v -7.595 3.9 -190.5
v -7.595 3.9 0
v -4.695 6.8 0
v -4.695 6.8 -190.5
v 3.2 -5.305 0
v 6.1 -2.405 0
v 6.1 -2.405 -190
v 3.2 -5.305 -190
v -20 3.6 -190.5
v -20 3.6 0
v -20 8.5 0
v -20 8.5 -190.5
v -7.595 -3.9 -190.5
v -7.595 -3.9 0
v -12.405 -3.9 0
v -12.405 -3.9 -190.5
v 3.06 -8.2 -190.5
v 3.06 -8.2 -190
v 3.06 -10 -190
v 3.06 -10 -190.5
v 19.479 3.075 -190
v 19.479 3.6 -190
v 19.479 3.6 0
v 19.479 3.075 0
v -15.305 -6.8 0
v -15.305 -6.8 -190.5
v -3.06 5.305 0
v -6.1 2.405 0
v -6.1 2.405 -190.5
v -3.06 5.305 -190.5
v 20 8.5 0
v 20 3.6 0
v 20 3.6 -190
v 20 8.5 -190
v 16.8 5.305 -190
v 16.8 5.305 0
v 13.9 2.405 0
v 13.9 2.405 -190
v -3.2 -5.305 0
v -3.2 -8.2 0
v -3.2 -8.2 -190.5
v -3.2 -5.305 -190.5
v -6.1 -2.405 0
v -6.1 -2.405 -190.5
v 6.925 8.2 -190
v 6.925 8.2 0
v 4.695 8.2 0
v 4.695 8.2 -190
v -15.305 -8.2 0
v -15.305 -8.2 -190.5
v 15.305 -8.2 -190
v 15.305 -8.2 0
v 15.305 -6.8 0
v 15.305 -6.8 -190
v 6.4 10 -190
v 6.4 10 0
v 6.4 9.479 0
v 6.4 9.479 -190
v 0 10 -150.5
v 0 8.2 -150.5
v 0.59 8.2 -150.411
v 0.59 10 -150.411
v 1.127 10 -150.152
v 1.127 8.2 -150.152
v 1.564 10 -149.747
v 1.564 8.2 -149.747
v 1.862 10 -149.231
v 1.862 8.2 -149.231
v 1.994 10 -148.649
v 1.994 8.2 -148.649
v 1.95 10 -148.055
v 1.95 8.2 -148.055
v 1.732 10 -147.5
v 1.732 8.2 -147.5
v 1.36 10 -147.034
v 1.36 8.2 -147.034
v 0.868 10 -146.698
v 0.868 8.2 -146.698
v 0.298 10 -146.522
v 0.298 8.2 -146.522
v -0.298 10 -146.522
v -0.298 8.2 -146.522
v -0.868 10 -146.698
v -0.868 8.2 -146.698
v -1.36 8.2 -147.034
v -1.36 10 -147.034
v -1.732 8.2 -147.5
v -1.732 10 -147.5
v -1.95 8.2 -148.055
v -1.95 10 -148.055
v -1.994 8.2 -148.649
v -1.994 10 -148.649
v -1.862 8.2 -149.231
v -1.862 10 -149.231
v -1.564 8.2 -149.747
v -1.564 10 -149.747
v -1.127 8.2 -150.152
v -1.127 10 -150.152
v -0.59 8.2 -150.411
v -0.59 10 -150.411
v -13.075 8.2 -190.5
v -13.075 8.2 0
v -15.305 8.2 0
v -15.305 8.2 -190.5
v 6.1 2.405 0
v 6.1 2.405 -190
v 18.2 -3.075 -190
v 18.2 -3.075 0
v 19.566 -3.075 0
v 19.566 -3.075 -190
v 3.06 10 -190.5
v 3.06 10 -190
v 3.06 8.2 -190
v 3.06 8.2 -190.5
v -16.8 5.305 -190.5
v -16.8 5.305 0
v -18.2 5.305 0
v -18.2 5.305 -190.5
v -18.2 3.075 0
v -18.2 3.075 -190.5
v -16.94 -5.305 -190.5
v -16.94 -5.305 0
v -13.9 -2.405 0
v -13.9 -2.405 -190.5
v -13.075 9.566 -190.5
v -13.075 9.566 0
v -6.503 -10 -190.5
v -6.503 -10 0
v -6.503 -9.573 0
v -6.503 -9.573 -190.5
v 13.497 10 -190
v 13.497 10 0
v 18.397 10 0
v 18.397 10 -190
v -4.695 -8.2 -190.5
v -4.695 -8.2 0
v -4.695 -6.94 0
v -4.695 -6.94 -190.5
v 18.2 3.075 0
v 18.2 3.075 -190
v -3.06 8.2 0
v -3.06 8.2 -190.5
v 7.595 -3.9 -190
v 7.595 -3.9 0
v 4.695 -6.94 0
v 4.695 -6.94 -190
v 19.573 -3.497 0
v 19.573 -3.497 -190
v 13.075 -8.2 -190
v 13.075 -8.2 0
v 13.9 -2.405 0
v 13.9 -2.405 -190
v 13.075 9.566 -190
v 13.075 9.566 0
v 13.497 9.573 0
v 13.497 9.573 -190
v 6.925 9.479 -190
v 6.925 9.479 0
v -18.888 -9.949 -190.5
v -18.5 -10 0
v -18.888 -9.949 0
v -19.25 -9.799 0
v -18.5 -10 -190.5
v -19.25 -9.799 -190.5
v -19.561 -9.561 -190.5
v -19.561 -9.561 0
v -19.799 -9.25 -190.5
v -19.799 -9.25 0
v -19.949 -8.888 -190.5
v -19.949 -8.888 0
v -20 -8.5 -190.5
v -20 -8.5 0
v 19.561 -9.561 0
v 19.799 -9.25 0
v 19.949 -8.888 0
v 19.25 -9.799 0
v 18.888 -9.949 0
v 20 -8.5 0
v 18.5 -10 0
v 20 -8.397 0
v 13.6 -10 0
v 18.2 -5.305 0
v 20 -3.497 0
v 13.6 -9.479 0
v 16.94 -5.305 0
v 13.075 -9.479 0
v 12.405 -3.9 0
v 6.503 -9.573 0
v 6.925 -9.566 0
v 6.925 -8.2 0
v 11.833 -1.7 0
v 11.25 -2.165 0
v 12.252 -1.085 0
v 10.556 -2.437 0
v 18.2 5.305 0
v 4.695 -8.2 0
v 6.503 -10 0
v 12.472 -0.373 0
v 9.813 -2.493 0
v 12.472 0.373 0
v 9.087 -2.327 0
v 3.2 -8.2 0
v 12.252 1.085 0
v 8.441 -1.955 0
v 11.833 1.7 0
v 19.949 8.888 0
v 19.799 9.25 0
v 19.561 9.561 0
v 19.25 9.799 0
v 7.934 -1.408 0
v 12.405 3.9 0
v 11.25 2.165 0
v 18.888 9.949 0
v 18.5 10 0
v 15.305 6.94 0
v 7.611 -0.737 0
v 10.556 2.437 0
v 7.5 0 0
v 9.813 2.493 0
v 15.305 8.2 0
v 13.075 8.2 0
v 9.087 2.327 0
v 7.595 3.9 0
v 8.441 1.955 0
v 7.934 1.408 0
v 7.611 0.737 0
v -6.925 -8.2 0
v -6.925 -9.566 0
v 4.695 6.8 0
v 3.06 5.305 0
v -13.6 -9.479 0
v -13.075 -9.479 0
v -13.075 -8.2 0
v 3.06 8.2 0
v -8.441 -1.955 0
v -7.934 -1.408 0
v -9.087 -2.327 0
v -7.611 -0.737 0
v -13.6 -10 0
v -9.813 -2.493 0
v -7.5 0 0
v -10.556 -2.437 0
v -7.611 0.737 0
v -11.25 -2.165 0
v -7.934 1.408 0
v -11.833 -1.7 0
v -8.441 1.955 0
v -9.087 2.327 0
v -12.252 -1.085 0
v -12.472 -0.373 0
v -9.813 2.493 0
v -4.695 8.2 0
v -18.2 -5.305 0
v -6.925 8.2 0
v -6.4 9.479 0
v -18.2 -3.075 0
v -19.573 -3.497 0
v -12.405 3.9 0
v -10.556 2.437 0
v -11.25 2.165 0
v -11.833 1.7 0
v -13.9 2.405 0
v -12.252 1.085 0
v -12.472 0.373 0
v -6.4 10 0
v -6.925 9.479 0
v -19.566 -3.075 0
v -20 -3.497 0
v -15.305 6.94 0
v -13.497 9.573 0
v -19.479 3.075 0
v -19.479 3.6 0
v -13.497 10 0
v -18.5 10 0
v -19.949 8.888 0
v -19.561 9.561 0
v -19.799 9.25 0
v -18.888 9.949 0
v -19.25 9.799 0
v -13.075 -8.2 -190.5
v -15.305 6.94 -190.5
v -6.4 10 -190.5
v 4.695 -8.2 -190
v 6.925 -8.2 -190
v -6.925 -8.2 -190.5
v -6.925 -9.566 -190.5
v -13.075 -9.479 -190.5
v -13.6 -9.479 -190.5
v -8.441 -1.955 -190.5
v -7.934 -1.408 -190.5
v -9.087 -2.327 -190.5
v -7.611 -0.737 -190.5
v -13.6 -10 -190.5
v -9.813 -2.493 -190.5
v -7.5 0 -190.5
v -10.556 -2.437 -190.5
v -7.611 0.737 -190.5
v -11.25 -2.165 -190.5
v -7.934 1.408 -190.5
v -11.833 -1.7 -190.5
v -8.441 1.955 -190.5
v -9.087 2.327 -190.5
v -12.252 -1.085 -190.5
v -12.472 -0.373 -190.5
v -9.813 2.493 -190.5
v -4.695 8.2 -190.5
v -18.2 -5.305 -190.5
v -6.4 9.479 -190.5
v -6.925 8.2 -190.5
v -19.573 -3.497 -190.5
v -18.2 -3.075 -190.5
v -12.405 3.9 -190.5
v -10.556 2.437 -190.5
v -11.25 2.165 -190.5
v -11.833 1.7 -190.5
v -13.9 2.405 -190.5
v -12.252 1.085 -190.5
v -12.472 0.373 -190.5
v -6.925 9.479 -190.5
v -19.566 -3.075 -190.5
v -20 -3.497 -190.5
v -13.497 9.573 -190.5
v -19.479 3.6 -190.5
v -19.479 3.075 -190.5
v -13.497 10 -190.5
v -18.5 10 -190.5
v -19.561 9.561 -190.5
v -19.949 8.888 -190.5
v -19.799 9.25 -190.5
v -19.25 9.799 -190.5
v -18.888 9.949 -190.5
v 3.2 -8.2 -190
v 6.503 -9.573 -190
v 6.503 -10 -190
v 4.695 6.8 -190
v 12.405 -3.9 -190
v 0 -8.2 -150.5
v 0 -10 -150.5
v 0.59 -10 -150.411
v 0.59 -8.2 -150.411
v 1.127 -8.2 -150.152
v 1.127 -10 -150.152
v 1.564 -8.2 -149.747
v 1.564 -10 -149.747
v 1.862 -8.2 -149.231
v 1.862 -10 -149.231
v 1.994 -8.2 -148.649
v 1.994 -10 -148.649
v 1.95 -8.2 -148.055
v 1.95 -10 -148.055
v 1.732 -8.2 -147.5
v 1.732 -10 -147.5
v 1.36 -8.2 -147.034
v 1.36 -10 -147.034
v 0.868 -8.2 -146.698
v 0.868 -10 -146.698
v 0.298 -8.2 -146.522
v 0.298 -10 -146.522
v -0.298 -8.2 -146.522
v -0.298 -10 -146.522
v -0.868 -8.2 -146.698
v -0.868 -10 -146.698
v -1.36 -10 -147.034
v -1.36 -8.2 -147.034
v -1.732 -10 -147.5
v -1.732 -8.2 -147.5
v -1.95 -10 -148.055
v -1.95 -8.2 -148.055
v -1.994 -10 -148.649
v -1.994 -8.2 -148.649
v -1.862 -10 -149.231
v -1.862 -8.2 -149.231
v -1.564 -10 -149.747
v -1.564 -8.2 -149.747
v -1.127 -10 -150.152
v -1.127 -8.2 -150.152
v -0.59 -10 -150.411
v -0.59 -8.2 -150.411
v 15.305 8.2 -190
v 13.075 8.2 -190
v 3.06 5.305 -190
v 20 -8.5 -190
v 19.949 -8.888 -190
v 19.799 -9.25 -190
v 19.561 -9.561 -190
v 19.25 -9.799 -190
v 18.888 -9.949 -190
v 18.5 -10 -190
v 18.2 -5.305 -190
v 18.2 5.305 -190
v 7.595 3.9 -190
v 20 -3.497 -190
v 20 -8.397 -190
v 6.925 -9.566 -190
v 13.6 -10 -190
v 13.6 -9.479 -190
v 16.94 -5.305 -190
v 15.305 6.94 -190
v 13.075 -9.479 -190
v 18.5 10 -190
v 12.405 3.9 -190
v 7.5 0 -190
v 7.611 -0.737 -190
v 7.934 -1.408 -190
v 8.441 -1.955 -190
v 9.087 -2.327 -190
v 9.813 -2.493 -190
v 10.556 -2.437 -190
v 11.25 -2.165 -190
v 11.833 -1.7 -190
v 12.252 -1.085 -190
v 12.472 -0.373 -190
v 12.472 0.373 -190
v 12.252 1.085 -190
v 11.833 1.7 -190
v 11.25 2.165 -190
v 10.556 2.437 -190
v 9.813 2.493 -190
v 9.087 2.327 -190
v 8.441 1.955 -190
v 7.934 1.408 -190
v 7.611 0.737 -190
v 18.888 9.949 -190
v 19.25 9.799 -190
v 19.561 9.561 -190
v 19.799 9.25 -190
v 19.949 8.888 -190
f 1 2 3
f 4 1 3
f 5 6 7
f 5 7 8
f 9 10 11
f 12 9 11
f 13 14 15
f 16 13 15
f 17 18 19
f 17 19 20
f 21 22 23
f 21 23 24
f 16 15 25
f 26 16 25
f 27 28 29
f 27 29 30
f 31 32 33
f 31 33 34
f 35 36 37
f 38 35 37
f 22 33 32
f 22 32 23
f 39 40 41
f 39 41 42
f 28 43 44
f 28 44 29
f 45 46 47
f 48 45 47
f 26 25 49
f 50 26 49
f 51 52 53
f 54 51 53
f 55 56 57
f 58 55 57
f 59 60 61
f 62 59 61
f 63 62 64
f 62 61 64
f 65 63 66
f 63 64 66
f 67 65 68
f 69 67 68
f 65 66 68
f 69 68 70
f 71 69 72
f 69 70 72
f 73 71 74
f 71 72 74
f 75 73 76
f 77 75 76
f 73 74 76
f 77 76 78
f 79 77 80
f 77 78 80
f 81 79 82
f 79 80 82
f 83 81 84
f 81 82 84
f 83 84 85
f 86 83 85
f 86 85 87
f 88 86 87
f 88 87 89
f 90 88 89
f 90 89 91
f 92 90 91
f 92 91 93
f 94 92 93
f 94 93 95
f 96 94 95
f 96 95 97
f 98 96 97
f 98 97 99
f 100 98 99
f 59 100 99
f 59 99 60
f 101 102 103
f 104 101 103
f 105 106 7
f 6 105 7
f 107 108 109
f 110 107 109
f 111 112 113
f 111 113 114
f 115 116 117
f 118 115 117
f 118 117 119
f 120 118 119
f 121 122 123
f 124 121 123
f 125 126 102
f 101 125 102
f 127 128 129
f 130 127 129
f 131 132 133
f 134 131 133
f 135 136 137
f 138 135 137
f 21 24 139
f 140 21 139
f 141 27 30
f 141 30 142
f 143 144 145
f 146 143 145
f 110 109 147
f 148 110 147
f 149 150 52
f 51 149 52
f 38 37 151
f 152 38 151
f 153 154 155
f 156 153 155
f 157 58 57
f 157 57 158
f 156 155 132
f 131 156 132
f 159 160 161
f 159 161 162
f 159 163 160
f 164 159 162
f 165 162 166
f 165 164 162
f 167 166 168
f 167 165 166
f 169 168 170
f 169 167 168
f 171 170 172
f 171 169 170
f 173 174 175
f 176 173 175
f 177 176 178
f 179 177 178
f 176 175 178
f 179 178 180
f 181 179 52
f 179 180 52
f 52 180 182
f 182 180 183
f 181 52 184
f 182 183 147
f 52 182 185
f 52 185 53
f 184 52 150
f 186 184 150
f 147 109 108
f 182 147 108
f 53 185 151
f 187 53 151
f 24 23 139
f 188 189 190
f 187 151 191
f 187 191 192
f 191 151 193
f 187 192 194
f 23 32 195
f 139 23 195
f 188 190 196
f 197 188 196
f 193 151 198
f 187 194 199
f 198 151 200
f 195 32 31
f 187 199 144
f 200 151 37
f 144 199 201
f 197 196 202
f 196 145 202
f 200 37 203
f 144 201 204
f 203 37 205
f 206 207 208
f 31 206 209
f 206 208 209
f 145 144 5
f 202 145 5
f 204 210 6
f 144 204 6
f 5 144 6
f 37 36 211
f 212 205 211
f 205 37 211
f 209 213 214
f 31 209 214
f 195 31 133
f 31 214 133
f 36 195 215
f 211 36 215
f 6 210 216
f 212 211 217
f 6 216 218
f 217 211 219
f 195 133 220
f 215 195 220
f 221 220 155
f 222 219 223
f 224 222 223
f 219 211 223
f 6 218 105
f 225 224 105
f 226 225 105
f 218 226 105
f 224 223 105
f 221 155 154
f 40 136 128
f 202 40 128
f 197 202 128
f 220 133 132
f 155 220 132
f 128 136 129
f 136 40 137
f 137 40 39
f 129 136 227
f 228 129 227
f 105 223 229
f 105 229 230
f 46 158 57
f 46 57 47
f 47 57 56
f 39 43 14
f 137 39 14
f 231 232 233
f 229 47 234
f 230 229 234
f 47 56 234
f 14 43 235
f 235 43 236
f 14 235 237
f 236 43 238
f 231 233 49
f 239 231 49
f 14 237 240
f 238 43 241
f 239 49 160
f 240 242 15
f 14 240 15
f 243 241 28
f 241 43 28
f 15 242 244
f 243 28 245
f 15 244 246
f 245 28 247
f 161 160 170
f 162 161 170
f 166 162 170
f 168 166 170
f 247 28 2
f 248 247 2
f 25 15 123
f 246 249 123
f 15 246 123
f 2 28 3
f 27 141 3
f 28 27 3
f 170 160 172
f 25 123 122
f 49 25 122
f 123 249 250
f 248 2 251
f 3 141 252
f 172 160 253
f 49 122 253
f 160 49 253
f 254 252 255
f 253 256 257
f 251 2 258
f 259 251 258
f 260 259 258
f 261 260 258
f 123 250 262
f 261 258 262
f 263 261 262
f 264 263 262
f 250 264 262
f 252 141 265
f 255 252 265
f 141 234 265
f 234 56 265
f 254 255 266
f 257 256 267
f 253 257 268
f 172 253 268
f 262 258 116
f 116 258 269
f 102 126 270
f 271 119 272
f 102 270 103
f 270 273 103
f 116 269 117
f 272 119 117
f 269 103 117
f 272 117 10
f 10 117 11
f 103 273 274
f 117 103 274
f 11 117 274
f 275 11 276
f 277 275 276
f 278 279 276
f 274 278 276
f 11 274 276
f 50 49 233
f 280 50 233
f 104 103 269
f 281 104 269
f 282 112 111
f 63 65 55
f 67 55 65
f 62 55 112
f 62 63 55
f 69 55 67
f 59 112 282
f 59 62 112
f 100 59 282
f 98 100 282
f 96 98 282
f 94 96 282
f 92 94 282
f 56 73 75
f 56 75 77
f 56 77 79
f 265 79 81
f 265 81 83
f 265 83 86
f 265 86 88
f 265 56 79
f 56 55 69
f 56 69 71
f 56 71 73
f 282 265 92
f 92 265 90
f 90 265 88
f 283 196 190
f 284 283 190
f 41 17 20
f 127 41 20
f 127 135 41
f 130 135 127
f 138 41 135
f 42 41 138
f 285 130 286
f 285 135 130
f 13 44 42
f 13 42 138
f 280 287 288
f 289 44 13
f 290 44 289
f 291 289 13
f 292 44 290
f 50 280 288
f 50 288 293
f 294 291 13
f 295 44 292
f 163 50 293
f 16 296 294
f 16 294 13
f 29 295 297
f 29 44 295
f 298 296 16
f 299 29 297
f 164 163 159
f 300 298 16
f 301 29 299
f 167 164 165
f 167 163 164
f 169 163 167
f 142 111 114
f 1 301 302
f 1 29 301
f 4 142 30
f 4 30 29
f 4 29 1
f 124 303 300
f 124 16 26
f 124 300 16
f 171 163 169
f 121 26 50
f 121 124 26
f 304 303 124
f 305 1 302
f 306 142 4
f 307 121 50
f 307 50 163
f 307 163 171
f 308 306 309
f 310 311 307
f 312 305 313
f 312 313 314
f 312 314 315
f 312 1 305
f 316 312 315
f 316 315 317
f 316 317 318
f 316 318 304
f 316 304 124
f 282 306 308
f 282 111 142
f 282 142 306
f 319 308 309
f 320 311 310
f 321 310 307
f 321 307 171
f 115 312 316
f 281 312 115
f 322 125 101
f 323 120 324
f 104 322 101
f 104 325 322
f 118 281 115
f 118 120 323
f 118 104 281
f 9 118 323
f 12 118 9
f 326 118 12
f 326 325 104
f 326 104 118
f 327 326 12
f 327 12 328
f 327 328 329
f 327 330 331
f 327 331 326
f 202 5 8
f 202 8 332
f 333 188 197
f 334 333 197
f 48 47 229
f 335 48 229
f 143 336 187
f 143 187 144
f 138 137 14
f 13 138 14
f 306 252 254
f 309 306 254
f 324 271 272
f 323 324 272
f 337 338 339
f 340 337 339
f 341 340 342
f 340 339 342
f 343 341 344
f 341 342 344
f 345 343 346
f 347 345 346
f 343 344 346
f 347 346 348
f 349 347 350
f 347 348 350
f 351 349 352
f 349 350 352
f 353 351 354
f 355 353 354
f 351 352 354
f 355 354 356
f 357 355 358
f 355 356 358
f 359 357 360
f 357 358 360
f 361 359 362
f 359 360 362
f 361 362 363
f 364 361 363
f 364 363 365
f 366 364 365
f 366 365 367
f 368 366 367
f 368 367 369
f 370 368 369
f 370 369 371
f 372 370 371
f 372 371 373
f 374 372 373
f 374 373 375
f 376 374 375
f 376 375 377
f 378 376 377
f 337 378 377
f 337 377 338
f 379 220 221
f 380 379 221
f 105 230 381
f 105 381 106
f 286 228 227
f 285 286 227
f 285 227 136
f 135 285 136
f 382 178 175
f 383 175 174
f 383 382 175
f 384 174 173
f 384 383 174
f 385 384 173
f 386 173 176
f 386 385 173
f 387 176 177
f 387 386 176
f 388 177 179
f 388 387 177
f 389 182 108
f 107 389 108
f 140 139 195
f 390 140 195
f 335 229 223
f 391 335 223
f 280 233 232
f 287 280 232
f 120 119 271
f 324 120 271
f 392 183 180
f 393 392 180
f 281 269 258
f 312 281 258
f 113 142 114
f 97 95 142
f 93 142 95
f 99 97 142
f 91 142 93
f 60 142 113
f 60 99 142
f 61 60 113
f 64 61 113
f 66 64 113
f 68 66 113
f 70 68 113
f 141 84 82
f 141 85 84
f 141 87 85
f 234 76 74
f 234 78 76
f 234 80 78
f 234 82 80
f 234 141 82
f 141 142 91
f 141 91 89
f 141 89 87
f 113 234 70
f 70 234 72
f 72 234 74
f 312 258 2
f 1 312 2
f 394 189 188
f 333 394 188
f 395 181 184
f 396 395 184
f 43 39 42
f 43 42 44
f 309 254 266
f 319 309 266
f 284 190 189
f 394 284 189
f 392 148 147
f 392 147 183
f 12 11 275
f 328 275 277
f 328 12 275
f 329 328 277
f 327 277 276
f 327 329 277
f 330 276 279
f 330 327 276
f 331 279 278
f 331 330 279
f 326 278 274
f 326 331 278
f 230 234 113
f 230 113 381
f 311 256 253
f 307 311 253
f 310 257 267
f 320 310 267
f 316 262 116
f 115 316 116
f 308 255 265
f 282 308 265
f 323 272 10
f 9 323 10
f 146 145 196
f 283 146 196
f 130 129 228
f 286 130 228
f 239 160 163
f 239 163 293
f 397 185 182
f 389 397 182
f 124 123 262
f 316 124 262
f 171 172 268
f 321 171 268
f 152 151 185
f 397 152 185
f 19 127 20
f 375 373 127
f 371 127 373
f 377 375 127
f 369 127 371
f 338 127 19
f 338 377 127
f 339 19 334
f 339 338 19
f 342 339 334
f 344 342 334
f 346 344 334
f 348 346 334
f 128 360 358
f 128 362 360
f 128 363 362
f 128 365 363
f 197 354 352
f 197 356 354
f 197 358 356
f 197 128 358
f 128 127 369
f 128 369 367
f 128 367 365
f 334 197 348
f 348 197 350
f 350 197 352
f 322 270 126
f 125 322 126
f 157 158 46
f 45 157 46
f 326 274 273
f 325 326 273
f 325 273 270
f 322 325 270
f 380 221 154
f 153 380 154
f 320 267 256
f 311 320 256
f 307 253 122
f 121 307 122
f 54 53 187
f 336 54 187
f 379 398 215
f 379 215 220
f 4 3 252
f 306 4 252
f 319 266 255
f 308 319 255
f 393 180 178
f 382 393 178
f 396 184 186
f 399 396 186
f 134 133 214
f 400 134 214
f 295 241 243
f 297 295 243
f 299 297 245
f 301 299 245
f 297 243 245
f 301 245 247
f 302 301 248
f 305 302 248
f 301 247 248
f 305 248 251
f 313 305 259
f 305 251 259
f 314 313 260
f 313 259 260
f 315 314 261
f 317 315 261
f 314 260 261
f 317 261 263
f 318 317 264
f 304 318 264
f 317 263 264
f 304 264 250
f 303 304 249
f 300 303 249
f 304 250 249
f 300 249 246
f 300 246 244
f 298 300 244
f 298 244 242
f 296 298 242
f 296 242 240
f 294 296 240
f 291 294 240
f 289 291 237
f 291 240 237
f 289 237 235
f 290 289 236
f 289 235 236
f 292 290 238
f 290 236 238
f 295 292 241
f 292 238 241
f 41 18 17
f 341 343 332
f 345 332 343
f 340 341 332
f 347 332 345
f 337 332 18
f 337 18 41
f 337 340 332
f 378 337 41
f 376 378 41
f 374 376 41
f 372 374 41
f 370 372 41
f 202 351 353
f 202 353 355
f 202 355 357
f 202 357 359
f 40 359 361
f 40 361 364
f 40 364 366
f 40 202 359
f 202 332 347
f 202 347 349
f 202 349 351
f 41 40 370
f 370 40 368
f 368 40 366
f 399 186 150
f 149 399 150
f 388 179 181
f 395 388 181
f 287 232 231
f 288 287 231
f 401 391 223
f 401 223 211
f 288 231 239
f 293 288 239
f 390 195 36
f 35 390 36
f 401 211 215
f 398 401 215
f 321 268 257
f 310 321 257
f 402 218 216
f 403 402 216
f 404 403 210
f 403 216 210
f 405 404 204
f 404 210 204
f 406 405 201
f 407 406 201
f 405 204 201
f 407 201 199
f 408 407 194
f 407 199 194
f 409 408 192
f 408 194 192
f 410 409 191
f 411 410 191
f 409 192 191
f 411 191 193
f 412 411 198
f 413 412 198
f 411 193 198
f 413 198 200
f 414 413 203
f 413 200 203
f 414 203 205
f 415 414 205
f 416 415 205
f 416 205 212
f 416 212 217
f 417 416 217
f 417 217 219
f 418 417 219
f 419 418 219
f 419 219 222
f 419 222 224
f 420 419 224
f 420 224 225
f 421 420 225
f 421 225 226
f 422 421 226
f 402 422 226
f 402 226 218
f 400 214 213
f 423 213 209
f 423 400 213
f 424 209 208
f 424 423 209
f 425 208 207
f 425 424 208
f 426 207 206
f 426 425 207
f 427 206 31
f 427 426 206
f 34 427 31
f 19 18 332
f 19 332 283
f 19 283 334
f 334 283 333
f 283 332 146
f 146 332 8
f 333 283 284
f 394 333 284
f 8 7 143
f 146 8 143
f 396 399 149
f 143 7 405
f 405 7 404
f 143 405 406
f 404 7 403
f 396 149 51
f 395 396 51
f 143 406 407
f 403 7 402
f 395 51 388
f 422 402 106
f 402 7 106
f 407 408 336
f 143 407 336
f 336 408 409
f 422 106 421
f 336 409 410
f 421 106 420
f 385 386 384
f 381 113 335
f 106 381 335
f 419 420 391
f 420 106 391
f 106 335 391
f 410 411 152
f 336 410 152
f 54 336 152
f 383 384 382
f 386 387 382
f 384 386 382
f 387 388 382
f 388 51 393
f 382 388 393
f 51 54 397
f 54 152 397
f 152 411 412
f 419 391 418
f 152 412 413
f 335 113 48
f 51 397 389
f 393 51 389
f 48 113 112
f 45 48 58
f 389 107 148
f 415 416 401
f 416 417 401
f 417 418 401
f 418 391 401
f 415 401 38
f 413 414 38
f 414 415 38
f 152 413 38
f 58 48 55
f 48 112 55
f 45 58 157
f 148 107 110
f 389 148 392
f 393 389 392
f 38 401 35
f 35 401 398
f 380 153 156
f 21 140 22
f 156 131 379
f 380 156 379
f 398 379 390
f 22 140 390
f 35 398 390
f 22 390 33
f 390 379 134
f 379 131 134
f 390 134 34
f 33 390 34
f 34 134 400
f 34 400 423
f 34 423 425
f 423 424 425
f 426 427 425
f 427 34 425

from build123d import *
from OCP.BRepAlgoAPI import BRepAlgoAPI_Cut
from OCP.TopTools import TopTools_ListOfShape

# Parameters (mm, degrees)
SKETCH1_R           = 2.5
BOSS_EXTRUDE1_DEPTH = 190.5
FILLET1_R           = 1.5
SKETCH2_W           = 16.94037733
SKETCH2_H           = 0.5
CUT_EXTRUDE1_DEPTH  = 23
SKETCH3_R           = 2
CUT_EXTRUDE2_DEPTH  = 23


with BuildPart() as part:
    # Sketch1 → Boss-Extrude1 (new body)
    with BuildSketch(Plane.XY):
        Polygon((-1.499992211, 10), (2.38e-06, 10), (1.500001785, 10), (6.400001785, 10), (6.400001785, 9.479132912), (6.925001785, 9.479132912), (6.925001785, 8.2), (4.695347664, 8.2), (4.695347664, 6.8), (7.595347664, 3.9), (12.404655907, 3.9), (15.304655907, 6.94037733), (15.304655907, 8.199999348), (13.075001785, 8.199999348), (13.075001785, 9.565762703), (13.497472172, 9.573136951), (13.497472172, 9.999999348), (18.397472172, 9.999999348), (20.000001785, 10), (20.000001785, 8.503508491), (20.000001785, 8.500000005), (20.000001785, 3.600001911), (19.479137611, 3.600002038), (19.479137484, 3.075002038), (18.200004571, 3.075002348), (18.200005113, 5.30465647), (16.800005113, 5.30465681), (13.900004408, 2.404657514), (13.900003241, -2.404650729), (16.940379867, -5.304651467), (18.200002536, -5.304651773), (18.200003078, -3.074997652), (19.565766433, -3.074997983), (19.573140578, -3.497468372), (20.000002975, -3.497468476), (20.000001785, -8.397468476), (20.000001785, -10), (18.500003987, -10), (13.600003987, -9.99999881), (13.600004114, -9.479131722), (13.075004114, -9.479131595), (13.075004424, -8.199998683), (15.304655907, -8.199999224), (15.304655907, -6.8), (12.404655907, -3.9), (7.595347664, -3.9), (4.695347664, -6.94037733), (4.695347664, -8.2), (6.925001785, -8.2), (6.925001785, -9.565763355), (6.502531399, -9.573137603), (6.502531399, -10), (1.602531399, -10), (2.38e-06, -10), (-1.602527233, -10), (-6.502525798, -10), (-6.502525798, -9.573137078), (-6.92499762, -9.565763355), (-6.92499762, -8.2), (-4.695343498, -8.2), (-4.695343498, -6.94037733), (-7.595343498, -3.9), (-12.404651741, -3.9), (-15.304651741, -6.8), (-15.304651741, -8.2), (-13.07499762, -8.2), (-13.07499762, -9.479132912), (-13.600001017, -9.479132912), (-13.600001017, -10), (-18.49999954, -10), (-19.99999762, -10), (-19.99999762, -3.497471822), (-19.573134698, -3.497471822), (-19.565760974, -3.075), (-18.19999762, -3.075), (-18.19999762, -5.304654122), (-16.94037495, -5.304654122), (-13.89999762, -2.404654122), (-13.89999762, 2.404654122), (-16.79999762, 5.304654122), (-18.19999762, 5.304654122), (-18.19999762, 3.075), (-19.479130532, 3.075), (-19.479130532, 3.600003398), (-19.99999762, 3.600003398), (-19.99999762, 10), (-13.497469442, 10), (-13.497469442, 9.573137078), (-13.07499762, 9.565763355), (-13.07499762, 8.2), (-15.304651741, 8.2), (-15.304651741, 6.94037733), (-12.404651741, 3.9), (-7.595343498, 3.9), (-4.695343498, 6.8), (-4.695343498, 8.2), (-6.92499762, 8.2), (-6.92499762, 9.479132912), (-6.399994222, 9.479132912), (-6.399994222, 10), align=None)
        with Locations((-9.99999762, 0)):
            Circle(SKETCH1_R, mode=Mode.SUBTRACT)
        with Locations(Location((9.99999762, 0, 0), (0, 0, 180))):
            Circle(SKETCH1_R, mode=Mode.SUBTRACT)
        Polygon((-3.059620289, 5.304654122), (-3.059620289, 8.2), (2.38e-06, 8.2), (3.059624455, 8.2), (3.059624455, 5.304654122), (6.100001785, 2.404654122), (6.100001785, -2.404654122), (3.200001785, -5.304654122), (3.200001785, -8.2), (2.38e-06, -8.2), (-3.19999762, -8.2), (-3.19999762, -5.304654122), (-6.09999762, -2.404654122), (-6.09999762, 2.404654122), align=None, mode=Mode.SUBTRACT)
    extrude(amount=-BOSS_EXTRUDE1_DEPTH)

    # Fillet1
    fillet1_edges = [part.edges().sort_by_distance(p)[0] for p in [
        (20.000001785, 10, -95.25),
        (20.000001785, -10, -95.25),
        (-19.99999762, -10, -95.25),
        (-19.99999762, 10, -95.25),
    ]]
    fillet(fillet1_edges, radius=FILLET1_R - 0.0001)  # a hair under: the kernel refuses the full size


with BuildPart() as cut_extrude1_tool:
    # Sketch2 → Cut-Extrude1 (new body)
    with BuildSketch(Plane(origin=(0, 10, 0), x_dir=(1, 0, 0), z_dir=(0, 1, 0))):
        with Locations((11.52981312, 190.25)):
            Rectangle(SKETCH2_W, SKETCH2_H)
    extrude(amount=-CUT_EXTRUDE1_DEPTH)


with BuildPart() as part_1:
    add(part.part)

    # Cut-Extrude1: cut by cut_extrude1_tool, with a tolerance
    cut_extrude1_stock = TopTools_ListOfShape()
    cut_extrude1_stock.Append(part_1.part.wrapped)
    cut_extrude1_tools = TopTools_ListOfShape()
    cut_extrude1_tools.Append(cut_extrude1_tool.part.wrapped)
    cut_extrude1_cut = BRepAlgoAPI_Cut()
    cut_extrude1_cut.SetArguments(cut_extrude1_stock)
    cut_extrude1_cut.SetTools(cut_extrude1_tools)
    cut_extrude1_cut.SetFuzzyValue(0.00001)
    cut_extrude1_cut.Build()
    add(Compound.cast(cut_extrude1_cut.Shape()).solids(), mode=Mode.REPLACE)

    # Sketch3 → Cut-Extrude2 (cut)
    with BuildSketch(Plane.XZ.offset(10)):
        with Locations(Location((2.8e-06, -148.5, 0), (0, 0, 270))):
            Circle(SKETCH3_R)
    extrude(amount=-CUT_EXTRUDE2_DEPTH, mode=Mode.SUBTRACT)


solid = part_1.part
